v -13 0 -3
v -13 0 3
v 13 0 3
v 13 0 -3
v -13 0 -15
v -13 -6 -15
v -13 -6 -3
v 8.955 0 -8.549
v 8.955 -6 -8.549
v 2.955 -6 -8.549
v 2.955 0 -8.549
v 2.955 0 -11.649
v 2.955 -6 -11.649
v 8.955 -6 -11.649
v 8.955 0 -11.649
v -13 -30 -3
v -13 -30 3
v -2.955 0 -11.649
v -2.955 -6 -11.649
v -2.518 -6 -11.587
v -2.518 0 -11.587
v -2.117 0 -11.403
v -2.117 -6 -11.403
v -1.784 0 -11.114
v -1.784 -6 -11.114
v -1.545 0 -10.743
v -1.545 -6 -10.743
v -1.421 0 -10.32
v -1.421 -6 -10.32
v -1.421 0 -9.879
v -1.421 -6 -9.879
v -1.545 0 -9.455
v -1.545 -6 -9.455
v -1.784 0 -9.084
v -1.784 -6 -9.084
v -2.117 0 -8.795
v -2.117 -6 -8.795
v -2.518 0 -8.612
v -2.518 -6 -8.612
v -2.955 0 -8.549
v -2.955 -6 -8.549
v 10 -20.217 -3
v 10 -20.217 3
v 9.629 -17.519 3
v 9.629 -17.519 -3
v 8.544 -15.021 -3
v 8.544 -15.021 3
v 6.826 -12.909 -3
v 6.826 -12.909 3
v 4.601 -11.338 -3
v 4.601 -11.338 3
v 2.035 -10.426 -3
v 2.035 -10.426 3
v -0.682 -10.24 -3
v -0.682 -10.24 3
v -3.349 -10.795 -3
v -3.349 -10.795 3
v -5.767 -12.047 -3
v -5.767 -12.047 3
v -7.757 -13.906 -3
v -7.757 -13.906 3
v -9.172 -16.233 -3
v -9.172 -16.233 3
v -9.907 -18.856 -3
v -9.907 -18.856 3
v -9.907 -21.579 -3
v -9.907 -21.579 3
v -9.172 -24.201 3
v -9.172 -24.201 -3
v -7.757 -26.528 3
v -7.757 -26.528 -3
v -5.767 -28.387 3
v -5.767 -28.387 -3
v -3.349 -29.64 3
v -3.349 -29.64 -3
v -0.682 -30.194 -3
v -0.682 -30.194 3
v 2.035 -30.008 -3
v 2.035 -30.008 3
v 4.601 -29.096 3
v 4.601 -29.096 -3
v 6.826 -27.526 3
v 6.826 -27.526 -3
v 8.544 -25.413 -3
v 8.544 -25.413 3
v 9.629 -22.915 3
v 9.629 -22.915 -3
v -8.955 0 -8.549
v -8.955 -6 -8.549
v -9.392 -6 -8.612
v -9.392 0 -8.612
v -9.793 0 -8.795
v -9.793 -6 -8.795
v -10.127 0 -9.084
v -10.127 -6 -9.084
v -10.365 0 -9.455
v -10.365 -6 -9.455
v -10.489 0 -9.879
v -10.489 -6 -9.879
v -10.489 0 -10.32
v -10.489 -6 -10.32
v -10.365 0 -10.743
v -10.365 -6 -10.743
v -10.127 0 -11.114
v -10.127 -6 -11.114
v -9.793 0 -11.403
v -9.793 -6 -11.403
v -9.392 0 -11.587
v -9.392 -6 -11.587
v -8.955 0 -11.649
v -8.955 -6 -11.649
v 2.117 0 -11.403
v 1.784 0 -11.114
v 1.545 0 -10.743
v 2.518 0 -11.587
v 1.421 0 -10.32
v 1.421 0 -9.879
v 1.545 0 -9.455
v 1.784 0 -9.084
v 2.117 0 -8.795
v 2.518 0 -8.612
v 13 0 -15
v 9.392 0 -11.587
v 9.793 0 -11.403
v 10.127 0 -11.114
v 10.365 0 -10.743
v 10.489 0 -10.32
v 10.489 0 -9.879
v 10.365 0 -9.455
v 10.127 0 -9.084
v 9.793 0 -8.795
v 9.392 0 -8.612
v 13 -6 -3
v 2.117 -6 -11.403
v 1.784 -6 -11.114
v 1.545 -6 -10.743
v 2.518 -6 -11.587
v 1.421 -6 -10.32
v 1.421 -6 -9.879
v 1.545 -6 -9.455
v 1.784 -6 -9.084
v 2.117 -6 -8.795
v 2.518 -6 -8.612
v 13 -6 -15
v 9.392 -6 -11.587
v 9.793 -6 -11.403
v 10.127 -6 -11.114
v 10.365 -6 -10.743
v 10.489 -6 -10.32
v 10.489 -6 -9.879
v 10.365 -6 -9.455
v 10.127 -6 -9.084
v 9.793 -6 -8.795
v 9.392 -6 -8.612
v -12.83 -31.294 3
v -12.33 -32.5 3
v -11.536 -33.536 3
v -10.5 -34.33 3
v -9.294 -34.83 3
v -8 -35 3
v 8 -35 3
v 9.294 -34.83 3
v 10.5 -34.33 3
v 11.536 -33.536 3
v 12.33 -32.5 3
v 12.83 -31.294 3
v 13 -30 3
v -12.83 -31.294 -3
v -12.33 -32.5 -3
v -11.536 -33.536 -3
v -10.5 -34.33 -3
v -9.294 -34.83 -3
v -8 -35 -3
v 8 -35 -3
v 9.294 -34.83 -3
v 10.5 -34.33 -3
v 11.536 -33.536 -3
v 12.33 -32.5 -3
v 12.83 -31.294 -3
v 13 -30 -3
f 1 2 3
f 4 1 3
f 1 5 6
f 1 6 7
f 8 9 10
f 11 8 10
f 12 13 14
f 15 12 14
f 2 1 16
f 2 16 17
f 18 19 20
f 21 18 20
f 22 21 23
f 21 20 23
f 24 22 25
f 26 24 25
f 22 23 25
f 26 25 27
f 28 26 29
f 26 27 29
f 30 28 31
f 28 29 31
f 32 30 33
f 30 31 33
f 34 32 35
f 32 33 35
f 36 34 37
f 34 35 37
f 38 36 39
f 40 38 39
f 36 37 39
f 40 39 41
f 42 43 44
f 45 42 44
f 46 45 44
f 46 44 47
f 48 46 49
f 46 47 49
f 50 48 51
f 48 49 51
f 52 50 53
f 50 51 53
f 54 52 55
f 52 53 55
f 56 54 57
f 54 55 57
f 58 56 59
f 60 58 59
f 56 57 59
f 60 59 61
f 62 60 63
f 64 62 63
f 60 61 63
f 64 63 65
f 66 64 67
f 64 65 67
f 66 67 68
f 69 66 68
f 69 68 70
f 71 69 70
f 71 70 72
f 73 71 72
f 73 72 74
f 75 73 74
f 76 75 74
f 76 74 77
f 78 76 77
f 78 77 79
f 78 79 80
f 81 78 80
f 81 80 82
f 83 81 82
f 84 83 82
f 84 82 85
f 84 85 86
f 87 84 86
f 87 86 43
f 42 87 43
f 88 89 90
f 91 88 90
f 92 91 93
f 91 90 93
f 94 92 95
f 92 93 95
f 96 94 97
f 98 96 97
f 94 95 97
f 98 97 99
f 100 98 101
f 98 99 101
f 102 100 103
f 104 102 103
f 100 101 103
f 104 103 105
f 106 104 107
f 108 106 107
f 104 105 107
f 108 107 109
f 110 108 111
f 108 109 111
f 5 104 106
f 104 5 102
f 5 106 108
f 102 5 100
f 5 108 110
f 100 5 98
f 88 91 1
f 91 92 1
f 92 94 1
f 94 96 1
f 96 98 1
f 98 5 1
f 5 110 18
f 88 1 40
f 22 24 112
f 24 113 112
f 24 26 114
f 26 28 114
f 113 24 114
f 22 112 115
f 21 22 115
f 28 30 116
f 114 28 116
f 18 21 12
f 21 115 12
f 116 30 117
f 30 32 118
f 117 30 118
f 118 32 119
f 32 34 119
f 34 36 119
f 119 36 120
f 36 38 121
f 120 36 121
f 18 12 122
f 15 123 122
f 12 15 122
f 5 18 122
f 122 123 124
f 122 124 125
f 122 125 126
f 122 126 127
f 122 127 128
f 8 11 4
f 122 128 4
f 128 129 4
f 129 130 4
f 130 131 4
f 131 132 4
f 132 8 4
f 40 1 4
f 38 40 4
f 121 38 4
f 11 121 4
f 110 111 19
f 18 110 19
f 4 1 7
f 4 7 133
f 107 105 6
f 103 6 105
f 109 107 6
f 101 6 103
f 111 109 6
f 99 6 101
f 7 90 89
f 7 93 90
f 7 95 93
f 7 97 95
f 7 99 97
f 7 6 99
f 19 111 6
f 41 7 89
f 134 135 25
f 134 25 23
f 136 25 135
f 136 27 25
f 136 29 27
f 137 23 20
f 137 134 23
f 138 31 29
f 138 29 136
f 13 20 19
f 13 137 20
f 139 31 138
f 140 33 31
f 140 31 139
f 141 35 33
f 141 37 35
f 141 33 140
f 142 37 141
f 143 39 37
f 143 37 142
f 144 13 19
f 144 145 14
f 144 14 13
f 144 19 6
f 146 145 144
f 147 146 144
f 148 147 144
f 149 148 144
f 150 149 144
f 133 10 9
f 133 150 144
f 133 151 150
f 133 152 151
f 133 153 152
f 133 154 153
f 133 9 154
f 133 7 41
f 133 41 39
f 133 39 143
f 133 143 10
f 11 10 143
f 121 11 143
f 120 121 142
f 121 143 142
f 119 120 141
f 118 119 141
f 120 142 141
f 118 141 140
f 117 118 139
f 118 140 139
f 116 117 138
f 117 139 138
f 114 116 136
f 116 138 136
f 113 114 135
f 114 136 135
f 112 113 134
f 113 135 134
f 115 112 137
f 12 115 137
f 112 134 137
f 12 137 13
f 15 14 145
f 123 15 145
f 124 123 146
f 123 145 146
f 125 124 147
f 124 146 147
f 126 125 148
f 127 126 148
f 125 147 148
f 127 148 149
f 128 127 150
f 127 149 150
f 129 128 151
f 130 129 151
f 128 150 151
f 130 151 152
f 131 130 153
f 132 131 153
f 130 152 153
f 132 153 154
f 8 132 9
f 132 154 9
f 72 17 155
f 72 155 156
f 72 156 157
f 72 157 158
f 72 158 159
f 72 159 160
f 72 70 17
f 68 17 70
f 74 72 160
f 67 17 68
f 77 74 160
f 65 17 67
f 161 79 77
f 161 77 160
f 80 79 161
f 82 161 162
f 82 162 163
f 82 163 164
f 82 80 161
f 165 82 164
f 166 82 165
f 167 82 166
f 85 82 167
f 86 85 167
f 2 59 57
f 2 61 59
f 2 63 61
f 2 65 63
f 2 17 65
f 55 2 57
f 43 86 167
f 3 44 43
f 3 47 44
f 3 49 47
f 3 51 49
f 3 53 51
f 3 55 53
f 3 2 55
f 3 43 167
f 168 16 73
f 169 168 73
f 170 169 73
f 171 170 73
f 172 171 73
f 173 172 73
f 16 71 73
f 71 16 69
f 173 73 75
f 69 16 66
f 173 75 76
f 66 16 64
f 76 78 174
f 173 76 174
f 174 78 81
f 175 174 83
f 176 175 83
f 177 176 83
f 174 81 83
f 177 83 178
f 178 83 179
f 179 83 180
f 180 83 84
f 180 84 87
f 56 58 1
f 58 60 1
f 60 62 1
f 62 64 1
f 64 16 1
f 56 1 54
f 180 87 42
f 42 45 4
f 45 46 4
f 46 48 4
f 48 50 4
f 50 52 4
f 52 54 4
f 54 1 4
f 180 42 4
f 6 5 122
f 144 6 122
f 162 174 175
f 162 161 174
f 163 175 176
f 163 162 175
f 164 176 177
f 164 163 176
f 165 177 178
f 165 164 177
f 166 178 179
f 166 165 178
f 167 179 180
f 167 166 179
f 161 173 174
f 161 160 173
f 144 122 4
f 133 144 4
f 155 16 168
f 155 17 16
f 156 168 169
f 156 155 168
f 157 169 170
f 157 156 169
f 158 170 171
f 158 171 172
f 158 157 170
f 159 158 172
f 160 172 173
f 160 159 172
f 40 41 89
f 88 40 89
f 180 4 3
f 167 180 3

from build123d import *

# Parameters (mm, degrees)
F1_W     = 26
F1_H     = 6
F2_DEPTH = 35
F1_H_2   = 12
F3_DEPTH = 6
F6_DEPTH = 6.001
F4_R     = 10
F7_DEPTH = 18.001
F8_R     = 5


with BuildPart() as f2:
    # F1 (on face) → F2 (new body)
    with BuildSketch(Plane.XZ):
        Rectangle(F1_W, F1_H)
    extrude(amount=F2_DEPTH)

    # F4 (on face) → F7 (cut, through all)
    with BuildSketch(Plane.XY.offset(3)):
        with Locations((0, -20.217184)):
            Circle(F4_R)
    extrude(amount=-F7_DEPTH, mode=Mode.SUBTRACT)

    # F8
    f8_edges = [f2.edges().sort_by_distance(p)[0] for p in [
        (-13, -35, 0),
        (13, -35, 0),
    ]]
    fillet(f8_edges, radius=F8_R)


with BuildPart() as f3:
    # F1 (on face) → F3 (new body)
    with BuildSketch(Plane.XZ):
        with Locations((0, -9)):
            Rectangle(F1_W, F1_H_2)
    extrude(amount=F3_DEPTH)

    # F5 (on face) → F6 (cut, through all)
    with BuildSketch(Plane.XZ.offset(6)):
        with BuildLine():
            ThreePointArc((2.955115, -8.549318), (1.405115, -10.099318), (2.955115, -11.649318))
            Line((2.955115, -11.649318), (8.955115, -11.649318))
            ThreePointArc((8.955115, -11.649318), (10.505115, -10.099318), (8.955115, -8.549318))
            Line((8.955115, -8.549318), (5.495168, -8.549318))
            Line((5.495168, -8.549318), (5.473115, -8.549318))
            Line((5.473115, -8.549318), (2.955115, -8.549318))
        make_face()
        with BuildLine():
            Line((-2.955115, -8.549318), (-5.473115, -8.549318))
            Line((-5.473115, -8.549318), (-5.495168, -8.549318))
            Line((-5.495168, -8.549318), (-8.955115, -8.549318))
            ThreePointArc((-8.955115, -8.549318), (-10.505115, -10.099318), (-8.955115, -11.649318))
            Line((-8.955115, -11.649318), (-2.955115, -11.649318))
            ThreePointArc((-2.955115, -11.649318), (-1.405115, -10.099318), (-2.955115, -8.549318))
        make_face()
    extrude(amount=-F6_DEPTH, mode=Mode.SUBTRACT)


solid = Compound([f2.part, f3.part])
